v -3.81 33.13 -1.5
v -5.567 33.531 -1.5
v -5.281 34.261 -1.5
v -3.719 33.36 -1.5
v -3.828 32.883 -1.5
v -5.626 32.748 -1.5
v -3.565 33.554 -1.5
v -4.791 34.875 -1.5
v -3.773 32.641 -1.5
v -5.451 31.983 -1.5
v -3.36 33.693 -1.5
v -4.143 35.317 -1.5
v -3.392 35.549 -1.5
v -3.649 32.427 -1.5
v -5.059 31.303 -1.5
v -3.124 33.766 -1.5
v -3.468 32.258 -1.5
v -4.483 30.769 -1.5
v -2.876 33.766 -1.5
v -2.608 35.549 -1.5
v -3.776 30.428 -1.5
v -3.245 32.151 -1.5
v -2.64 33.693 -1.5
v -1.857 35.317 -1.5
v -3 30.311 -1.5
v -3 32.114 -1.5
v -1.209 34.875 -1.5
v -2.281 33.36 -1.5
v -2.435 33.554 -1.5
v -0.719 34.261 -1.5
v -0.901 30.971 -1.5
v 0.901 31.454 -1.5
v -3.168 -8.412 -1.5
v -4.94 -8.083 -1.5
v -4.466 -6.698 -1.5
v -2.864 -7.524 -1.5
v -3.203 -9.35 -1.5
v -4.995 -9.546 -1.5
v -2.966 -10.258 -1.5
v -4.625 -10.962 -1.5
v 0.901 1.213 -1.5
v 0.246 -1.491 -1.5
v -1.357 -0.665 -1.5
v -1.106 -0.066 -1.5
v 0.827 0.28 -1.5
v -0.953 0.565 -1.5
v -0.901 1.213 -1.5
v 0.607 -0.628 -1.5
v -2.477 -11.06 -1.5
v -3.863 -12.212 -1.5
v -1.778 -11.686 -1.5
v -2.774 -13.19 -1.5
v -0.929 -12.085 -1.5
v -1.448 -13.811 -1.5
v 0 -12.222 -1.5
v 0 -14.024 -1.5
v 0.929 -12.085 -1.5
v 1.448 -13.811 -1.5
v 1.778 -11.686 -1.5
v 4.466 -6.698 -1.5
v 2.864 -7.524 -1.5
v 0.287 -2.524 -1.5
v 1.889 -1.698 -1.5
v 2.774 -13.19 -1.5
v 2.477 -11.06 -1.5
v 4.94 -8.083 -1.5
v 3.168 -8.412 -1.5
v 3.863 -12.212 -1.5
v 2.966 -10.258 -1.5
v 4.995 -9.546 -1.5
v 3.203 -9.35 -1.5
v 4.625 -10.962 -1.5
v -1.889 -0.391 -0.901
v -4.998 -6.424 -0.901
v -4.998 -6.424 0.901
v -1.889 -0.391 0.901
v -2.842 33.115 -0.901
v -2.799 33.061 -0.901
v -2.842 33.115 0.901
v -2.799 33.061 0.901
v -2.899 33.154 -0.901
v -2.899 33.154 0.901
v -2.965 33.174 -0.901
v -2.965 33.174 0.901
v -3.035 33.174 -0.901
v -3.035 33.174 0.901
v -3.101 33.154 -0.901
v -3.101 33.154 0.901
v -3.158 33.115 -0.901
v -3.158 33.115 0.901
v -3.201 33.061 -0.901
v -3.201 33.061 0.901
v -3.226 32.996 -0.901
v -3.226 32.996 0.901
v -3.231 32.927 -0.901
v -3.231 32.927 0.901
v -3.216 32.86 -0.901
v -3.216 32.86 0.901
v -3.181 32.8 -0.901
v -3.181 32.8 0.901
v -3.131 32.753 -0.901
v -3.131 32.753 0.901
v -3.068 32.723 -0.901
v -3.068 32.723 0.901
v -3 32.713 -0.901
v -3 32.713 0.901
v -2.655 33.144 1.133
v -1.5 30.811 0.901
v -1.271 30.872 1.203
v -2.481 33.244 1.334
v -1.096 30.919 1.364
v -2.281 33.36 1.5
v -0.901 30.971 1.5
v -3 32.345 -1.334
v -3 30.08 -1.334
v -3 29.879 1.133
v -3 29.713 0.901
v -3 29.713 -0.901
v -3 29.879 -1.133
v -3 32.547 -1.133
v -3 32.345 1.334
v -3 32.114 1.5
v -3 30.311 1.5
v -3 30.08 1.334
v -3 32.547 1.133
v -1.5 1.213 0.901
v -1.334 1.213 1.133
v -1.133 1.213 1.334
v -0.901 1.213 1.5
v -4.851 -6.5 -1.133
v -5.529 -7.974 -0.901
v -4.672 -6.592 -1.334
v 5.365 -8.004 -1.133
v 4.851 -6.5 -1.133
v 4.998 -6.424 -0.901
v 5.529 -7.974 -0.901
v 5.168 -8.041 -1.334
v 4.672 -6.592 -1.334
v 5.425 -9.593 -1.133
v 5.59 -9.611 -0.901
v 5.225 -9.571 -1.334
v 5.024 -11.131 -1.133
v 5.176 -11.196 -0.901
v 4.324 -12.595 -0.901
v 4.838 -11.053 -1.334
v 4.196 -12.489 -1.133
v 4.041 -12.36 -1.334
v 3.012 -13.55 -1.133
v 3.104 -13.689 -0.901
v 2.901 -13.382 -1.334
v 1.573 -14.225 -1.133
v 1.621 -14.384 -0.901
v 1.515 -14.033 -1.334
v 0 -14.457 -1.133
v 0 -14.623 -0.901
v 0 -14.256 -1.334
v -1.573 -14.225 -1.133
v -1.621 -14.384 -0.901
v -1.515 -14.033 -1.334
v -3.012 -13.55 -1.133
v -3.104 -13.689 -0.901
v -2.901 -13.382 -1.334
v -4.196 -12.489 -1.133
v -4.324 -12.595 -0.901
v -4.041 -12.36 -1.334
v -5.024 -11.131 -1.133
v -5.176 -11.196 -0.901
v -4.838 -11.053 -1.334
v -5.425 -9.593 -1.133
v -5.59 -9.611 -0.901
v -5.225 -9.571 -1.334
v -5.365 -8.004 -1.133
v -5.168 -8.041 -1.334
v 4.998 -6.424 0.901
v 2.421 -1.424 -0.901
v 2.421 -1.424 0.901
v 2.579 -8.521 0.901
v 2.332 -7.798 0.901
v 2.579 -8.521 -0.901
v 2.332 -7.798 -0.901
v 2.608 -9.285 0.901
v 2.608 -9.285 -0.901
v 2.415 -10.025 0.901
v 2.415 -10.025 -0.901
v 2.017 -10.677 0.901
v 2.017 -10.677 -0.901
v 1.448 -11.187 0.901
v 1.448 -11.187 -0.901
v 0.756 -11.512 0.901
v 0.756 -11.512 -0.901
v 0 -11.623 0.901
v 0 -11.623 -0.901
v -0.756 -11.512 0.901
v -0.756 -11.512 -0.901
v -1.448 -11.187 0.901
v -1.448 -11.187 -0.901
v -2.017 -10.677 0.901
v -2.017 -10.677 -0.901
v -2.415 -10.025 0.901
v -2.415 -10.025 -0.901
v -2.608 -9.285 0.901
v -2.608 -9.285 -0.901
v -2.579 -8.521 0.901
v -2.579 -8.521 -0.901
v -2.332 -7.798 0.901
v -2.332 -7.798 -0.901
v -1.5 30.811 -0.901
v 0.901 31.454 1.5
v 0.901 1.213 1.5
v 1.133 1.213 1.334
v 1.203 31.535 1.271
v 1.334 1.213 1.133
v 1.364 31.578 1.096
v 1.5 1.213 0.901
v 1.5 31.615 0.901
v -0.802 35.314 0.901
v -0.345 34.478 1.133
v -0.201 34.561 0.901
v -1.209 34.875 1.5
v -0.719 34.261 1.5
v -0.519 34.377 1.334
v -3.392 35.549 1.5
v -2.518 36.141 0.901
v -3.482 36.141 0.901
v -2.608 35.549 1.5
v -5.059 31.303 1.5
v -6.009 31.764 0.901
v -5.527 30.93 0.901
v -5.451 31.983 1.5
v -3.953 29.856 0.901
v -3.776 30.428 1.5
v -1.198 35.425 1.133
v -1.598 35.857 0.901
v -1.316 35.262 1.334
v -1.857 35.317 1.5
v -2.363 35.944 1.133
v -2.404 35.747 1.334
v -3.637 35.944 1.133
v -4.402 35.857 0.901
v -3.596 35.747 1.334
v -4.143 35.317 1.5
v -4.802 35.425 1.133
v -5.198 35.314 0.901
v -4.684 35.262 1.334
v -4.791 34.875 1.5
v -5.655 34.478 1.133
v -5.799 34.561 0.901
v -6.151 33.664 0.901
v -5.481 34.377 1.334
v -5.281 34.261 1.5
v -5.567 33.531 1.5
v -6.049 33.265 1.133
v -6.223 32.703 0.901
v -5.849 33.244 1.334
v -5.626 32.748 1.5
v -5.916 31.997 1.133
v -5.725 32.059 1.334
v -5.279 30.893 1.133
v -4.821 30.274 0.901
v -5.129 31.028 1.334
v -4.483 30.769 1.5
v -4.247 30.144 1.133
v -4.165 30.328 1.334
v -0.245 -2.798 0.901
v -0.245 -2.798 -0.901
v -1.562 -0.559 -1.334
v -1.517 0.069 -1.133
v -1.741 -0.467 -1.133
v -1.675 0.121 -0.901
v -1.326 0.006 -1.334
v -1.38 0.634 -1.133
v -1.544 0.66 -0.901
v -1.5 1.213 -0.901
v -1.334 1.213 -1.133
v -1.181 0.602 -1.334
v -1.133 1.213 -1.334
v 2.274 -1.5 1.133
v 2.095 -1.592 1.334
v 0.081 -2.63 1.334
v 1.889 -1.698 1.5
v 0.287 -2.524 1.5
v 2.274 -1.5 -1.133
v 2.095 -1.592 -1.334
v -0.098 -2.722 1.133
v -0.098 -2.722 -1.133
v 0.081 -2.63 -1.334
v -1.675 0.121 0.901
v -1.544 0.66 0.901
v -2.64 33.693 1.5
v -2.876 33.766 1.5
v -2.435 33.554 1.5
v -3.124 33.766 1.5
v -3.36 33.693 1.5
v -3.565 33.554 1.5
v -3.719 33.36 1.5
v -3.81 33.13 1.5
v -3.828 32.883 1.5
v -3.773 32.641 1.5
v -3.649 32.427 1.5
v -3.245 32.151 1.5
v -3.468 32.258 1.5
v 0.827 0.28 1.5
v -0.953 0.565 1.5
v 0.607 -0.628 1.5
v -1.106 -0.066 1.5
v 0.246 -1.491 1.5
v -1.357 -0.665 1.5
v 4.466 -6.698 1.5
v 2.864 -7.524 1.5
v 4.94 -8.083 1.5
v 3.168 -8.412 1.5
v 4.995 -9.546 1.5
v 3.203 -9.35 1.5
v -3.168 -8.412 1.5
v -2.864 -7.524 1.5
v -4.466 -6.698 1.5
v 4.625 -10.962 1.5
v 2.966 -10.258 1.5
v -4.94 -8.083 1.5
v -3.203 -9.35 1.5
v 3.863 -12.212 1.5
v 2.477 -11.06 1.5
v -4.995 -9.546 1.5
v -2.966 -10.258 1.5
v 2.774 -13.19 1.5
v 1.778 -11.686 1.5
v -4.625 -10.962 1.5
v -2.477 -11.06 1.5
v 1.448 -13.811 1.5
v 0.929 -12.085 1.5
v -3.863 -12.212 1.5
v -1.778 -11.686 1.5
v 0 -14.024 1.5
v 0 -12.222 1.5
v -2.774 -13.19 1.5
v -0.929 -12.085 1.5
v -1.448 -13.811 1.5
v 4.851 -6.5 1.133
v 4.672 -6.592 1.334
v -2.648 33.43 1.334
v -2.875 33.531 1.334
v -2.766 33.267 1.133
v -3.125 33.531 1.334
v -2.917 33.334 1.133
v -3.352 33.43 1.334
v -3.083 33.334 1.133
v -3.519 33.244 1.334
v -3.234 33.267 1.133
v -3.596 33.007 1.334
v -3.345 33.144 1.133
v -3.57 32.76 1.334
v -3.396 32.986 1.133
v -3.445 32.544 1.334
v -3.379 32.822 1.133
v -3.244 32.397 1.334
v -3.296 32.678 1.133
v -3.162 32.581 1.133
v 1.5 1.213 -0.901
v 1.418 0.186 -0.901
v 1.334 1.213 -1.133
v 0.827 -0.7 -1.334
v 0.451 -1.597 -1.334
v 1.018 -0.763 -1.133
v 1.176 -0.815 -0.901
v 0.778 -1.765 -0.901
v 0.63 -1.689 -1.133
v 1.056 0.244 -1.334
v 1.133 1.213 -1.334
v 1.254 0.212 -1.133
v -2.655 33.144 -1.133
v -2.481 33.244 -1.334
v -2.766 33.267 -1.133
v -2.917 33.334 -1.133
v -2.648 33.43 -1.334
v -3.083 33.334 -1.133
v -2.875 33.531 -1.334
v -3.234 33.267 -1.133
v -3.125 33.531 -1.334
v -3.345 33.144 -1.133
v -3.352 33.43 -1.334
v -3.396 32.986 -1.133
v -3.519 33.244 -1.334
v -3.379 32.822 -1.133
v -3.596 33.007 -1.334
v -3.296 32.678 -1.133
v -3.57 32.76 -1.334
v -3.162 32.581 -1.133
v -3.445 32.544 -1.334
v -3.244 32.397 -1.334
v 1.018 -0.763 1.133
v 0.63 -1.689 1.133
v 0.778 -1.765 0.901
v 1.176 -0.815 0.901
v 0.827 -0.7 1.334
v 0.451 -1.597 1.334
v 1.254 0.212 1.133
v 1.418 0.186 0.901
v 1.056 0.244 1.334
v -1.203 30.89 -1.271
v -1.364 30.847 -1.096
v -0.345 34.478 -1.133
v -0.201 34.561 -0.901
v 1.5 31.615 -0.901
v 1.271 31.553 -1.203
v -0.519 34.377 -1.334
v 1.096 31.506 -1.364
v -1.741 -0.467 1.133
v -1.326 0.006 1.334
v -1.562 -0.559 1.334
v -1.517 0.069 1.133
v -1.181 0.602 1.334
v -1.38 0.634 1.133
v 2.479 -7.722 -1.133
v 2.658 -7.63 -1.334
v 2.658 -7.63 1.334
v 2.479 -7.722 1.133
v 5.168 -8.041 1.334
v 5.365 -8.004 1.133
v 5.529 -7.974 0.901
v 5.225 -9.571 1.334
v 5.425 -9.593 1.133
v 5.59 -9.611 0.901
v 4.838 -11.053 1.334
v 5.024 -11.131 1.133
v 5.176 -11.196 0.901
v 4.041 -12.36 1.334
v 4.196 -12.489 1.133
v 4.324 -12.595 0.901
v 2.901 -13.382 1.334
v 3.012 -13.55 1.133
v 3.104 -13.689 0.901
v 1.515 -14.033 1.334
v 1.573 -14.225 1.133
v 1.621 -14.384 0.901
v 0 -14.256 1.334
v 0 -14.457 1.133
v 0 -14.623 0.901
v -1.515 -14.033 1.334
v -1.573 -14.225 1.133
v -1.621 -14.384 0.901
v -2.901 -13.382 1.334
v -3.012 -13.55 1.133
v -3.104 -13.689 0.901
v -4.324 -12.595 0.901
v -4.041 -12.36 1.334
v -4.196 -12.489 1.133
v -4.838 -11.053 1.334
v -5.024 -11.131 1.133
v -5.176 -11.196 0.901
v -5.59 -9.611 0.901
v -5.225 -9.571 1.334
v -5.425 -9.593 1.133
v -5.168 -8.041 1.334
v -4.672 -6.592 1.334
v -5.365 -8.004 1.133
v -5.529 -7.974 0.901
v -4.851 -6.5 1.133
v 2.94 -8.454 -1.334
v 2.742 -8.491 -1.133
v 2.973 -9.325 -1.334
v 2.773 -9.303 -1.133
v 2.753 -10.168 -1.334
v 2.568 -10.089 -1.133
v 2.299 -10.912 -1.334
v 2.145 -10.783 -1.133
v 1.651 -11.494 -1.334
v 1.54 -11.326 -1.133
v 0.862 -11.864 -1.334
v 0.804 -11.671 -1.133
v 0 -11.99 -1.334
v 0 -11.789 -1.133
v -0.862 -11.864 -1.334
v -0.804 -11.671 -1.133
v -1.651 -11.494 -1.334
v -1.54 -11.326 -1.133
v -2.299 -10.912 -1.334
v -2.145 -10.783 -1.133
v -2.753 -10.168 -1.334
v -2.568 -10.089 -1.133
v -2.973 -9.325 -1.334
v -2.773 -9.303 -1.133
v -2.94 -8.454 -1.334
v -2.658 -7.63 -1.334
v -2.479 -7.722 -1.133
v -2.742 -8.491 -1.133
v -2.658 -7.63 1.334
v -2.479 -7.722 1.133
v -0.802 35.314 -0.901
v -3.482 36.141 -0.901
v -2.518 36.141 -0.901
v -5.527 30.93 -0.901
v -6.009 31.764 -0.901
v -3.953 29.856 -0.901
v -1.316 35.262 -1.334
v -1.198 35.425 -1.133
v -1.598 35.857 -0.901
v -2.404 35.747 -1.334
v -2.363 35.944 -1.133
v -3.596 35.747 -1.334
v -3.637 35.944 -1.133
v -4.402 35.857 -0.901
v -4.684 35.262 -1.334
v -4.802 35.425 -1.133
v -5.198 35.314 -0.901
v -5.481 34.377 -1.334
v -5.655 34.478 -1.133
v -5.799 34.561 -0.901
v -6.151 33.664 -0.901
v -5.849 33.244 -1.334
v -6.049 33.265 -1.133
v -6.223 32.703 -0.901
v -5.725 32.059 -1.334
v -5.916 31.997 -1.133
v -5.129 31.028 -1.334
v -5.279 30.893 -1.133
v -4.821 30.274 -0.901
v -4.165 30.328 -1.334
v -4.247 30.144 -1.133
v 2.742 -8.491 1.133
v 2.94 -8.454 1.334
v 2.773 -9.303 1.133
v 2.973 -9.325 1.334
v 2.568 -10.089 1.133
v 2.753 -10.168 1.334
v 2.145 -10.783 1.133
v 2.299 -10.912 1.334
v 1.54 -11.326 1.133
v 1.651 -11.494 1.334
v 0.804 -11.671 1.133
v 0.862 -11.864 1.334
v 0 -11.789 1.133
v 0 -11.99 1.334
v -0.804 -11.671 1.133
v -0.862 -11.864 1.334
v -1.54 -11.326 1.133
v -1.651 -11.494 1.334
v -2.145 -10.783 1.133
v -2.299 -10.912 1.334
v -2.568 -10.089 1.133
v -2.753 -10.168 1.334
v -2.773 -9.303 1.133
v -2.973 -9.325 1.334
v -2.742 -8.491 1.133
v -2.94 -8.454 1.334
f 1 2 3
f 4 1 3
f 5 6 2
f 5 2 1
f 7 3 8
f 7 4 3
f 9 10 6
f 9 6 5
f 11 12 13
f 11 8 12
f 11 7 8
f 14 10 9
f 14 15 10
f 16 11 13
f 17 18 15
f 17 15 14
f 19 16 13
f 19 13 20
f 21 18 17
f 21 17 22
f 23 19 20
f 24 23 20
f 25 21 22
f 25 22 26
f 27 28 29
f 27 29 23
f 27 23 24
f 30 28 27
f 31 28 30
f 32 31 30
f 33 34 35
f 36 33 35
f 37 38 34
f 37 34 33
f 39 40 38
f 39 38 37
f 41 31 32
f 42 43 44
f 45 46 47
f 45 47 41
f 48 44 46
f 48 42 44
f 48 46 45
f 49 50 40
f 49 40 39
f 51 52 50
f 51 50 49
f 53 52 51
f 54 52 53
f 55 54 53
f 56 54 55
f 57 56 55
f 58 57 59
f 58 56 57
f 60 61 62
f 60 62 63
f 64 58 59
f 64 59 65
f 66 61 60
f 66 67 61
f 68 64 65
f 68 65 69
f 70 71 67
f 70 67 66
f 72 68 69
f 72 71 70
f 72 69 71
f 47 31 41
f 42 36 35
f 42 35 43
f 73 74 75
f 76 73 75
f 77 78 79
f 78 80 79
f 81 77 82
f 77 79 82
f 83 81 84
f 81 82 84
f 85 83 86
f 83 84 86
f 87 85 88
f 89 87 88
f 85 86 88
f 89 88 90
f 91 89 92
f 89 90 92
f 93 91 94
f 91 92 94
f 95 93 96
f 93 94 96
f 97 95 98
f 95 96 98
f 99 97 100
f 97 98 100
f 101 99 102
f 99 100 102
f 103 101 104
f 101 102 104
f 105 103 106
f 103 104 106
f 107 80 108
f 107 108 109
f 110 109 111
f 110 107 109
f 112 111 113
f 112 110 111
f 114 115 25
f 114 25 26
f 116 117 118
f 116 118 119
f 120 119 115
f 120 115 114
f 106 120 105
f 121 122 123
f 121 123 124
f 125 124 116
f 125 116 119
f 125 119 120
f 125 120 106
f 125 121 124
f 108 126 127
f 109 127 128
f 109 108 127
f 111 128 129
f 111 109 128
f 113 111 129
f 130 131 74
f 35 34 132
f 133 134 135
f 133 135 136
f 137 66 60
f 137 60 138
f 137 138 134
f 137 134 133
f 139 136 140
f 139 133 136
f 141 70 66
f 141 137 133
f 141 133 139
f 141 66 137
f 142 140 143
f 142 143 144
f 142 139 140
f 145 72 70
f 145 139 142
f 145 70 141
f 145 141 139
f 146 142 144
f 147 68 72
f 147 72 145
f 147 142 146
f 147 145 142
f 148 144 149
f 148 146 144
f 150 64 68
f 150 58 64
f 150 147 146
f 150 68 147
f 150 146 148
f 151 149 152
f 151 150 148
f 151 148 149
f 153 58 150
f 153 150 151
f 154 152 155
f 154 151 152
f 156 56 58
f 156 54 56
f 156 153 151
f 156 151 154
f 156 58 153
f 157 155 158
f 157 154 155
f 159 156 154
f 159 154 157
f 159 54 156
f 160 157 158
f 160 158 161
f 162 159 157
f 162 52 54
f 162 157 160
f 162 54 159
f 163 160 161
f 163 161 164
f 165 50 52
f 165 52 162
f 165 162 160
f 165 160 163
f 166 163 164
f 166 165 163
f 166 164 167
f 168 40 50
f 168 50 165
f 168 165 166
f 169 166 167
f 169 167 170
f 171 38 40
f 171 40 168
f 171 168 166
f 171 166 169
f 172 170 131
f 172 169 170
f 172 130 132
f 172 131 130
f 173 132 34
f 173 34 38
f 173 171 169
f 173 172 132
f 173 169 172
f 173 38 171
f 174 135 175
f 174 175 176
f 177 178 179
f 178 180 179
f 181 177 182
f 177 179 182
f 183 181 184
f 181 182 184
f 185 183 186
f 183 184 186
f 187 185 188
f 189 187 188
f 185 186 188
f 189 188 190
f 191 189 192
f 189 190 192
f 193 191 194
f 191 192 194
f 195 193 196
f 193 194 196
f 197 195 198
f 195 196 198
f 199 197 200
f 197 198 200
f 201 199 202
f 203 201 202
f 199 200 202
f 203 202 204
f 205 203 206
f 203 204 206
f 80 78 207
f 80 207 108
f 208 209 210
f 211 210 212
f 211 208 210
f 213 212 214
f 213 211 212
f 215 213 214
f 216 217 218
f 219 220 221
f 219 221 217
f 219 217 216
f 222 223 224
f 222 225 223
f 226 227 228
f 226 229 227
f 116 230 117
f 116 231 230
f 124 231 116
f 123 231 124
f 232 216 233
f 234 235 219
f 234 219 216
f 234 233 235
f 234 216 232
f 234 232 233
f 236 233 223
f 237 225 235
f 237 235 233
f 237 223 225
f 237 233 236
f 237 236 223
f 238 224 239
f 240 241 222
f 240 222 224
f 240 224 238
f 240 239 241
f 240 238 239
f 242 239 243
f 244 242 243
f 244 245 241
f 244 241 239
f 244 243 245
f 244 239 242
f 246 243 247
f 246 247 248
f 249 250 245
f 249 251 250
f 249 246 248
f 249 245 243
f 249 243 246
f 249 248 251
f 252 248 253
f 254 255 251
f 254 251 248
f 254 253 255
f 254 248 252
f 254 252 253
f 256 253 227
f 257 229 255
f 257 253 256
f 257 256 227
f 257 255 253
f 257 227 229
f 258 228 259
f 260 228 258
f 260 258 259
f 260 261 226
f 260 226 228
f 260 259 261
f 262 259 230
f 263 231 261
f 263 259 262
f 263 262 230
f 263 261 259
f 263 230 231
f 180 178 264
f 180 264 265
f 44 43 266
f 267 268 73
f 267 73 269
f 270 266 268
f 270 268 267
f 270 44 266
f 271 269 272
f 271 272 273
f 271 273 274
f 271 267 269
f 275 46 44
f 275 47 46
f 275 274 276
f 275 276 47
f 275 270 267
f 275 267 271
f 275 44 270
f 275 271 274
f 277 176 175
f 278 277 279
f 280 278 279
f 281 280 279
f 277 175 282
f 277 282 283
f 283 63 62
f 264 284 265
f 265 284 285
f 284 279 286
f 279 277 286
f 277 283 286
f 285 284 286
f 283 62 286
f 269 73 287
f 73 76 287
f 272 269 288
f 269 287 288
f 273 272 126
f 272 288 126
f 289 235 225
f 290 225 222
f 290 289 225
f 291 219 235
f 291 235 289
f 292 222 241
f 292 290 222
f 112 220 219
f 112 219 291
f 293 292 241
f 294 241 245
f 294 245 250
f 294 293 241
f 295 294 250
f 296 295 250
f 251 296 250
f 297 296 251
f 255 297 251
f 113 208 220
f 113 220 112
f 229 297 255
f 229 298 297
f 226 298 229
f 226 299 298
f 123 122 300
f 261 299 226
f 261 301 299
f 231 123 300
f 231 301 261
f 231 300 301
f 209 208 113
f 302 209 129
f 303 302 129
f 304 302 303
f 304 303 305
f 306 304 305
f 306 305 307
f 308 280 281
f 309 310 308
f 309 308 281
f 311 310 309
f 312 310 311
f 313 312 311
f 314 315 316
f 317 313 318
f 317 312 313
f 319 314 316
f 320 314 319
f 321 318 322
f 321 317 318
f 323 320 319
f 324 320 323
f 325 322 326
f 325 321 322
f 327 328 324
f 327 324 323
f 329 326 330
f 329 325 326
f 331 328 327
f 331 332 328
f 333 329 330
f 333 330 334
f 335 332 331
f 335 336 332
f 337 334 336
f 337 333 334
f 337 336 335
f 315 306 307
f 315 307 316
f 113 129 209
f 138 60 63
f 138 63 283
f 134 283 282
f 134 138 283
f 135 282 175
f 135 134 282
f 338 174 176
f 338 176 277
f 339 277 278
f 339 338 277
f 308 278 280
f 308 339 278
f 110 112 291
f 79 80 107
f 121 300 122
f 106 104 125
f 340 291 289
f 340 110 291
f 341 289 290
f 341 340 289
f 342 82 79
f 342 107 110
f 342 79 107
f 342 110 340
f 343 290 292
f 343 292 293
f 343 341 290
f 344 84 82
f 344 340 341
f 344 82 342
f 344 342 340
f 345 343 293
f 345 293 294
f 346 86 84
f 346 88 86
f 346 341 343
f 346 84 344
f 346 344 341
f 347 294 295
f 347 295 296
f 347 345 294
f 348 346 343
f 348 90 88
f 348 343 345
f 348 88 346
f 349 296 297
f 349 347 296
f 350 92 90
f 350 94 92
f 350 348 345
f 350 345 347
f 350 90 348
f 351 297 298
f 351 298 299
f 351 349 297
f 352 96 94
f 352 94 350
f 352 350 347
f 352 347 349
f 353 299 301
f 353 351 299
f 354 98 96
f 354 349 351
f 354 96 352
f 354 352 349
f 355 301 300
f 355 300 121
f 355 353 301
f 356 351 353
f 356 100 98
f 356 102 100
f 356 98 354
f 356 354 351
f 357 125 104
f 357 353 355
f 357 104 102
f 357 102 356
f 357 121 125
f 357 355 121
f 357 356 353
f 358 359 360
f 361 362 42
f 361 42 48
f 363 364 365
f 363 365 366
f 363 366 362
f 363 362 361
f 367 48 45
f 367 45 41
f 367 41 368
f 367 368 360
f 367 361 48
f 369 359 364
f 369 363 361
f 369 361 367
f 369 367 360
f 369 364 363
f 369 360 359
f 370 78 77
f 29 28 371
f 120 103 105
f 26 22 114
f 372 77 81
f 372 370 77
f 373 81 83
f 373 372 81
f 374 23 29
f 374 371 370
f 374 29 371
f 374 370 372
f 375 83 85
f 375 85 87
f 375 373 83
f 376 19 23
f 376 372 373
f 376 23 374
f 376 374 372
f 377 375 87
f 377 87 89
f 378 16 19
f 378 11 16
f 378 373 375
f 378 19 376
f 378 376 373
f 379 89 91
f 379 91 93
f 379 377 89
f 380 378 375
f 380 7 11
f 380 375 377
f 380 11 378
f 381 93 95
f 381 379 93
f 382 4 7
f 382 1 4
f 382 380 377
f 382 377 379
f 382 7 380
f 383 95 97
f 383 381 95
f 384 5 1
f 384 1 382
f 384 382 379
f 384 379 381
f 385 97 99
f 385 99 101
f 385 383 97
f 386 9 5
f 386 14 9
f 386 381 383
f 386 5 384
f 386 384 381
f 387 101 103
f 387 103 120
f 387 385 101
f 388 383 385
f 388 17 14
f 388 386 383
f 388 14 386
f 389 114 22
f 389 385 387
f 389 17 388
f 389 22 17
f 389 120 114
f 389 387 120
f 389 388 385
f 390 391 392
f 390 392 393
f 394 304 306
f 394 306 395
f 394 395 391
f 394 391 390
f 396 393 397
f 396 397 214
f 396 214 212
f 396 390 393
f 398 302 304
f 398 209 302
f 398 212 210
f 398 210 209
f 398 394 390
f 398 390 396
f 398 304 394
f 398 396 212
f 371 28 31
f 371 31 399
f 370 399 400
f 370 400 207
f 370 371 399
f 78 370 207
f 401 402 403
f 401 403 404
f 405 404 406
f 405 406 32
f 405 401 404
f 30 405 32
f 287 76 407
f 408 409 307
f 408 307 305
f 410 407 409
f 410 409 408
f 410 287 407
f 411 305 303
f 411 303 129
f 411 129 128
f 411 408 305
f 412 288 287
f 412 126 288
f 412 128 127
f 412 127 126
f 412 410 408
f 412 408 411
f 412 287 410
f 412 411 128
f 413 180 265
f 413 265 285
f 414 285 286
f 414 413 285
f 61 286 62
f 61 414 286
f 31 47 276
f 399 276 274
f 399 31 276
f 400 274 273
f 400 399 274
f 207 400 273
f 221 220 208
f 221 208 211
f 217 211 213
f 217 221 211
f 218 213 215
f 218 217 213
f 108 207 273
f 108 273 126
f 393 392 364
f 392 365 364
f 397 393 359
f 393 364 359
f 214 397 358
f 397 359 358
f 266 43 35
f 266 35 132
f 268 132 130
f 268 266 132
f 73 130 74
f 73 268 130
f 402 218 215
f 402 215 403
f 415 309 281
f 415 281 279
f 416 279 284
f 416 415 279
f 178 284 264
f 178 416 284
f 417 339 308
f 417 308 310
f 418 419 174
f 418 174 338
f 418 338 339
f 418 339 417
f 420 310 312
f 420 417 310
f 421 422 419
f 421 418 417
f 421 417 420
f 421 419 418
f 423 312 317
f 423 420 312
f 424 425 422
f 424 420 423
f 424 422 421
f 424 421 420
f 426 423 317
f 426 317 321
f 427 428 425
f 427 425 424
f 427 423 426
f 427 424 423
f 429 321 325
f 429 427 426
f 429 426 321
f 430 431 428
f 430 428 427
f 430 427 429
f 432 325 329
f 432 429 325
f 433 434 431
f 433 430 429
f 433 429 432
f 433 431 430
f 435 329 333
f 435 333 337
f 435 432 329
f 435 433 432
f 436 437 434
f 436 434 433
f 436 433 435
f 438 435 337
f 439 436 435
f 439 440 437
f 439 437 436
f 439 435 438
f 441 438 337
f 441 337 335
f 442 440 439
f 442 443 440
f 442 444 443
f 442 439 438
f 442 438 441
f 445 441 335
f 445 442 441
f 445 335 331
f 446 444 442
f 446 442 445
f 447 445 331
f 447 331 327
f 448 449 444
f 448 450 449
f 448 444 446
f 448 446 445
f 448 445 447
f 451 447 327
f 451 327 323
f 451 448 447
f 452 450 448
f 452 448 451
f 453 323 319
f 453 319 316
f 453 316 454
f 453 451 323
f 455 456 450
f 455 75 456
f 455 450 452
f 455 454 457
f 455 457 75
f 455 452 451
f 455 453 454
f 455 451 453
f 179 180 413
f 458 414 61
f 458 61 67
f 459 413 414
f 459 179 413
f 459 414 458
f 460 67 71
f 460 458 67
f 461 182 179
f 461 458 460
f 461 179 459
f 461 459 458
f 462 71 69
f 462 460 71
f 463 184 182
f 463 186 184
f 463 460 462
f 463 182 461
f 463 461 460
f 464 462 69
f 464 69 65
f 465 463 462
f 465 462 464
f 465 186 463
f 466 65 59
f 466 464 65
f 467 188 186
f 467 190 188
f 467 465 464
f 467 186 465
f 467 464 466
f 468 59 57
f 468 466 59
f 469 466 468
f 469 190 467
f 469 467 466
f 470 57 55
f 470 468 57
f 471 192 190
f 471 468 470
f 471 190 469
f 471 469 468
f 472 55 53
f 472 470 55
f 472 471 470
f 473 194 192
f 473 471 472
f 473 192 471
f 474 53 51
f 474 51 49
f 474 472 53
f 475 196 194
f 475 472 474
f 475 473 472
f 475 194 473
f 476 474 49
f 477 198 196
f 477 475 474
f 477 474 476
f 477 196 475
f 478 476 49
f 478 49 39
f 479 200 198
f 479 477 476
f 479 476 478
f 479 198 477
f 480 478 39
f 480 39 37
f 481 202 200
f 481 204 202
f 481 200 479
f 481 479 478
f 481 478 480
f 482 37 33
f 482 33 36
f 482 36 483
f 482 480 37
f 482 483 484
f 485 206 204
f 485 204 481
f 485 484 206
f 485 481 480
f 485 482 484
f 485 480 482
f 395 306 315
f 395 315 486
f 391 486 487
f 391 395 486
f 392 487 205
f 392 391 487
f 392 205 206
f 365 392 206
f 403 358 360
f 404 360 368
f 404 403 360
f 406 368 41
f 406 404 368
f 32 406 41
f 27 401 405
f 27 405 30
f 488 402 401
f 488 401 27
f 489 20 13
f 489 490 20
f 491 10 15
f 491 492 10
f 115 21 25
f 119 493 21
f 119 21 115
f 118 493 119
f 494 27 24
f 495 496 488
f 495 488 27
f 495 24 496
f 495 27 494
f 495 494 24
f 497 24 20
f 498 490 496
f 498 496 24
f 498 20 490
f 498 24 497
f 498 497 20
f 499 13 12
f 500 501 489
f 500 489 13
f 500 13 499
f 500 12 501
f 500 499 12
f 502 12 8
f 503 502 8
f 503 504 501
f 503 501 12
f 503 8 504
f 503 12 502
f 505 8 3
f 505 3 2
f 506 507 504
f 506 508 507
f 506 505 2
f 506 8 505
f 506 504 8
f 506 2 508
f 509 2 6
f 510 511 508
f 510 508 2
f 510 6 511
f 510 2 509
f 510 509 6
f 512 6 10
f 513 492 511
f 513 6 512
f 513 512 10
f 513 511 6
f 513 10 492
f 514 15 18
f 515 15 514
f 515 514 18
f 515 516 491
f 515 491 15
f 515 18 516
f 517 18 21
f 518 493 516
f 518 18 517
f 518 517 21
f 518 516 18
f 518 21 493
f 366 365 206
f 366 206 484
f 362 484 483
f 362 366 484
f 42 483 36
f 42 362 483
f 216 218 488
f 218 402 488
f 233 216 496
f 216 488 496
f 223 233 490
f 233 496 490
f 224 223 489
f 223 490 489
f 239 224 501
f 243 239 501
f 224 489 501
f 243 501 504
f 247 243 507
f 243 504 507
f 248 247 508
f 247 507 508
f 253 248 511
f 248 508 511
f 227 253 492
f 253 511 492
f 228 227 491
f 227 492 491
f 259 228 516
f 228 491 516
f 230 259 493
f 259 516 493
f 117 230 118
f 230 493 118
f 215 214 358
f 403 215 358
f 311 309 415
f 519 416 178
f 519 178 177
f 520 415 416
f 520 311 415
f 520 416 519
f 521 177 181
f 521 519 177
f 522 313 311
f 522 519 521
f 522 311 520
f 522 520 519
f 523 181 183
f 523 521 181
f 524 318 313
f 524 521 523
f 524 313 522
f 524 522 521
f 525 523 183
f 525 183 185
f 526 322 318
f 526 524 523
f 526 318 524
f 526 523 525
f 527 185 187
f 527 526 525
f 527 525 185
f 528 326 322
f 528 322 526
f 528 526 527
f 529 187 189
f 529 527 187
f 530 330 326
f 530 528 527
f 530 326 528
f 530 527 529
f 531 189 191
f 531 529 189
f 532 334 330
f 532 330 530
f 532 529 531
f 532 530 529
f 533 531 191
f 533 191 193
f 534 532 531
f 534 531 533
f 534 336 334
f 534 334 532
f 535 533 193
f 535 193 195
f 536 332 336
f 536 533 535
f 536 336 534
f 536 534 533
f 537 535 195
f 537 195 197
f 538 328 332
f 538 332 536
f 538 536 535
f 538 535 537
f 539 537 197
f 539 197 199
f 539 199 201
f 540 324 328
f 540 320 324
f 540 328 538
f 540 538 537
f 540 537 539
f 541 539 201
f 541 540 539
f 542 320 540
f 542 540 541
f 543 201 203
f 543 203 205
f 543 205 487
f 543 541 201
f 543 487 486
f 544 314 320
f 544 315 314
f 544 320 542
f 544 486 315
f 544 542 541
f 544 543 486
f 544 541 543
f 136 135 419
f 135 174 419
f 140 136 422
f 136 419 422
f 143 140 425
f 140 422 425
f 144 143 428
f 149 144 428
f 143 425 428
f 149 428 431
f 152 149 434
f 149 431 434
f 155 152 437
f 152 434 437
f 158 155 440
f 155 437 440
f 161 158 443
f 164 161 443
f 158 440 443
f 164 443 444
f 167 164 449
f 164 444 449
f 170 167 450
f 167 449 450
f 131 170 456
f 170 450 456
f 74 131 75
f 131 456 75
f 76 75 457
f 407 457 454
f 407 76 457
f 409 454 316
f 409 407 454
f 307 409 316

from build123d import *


with BuildPart() as part:
    # 掃出1: sweep along a path in 草圖1
    with BuildLine(Plane.XY) as sweep_1_path:
        Line((1.088041762, -2.111111111), (3.664982778, -7.111111111))
        ThreePointArc((3.664982778, -7.111111111), (0, -13.123105626), (-3.664982778, -7.111111111))
        Line((-3.664982778, -7.111111111), (-0.555555556, -1.077936111))
        ThreePointArc((-0.555555556, -1.077936111), (-0.140873421, 0.034166823), (0, 1.212678125))
        Line((0, 1.212678125), (0, 31.212678125))
        Line((0, 31.212678125), (-1.5, 33.810754337))
        ThreePointArc((-1.5, 33.810754337), (-4.5, 33.810754337), (-3, 31.212678125))
    # 草圖3 → 掃出1 (sweep)
    with BuildSketch(Plane(origin=(-3, 31.212678125, 0), x_dir=(0, 0, -1), z_dir=(1, 0, 0))):
        with BuildLine():
            Line((-0.901387819, 1.5), (0.901387819, 1.5))
            ThreePointArc((0.901387819, 1.5), (1.237436867, 1.237436867), (1.5, 0.901387819))
            Line((1.5, 0.901387819), (1.5, -0.901387819))
            ThreePointArc((1.5, -0.901387819), (1.237436867, -1.237436867), (0.901387819, -1.5))
            Line((0.901387819, -1.5), (-0.901387819, -1.5))
            ThreePointArc((-0.901387819, -1.5), (-1.237436867, -1.237436867), (-1.5, -0.901387819))
            Line((-1.5, -0.901387819), (-1.5, 0.901387819))
            ThreePointArc((-1.5, 0.901387819), (-1.237436867, 1.237436867), (-0.901387819, 1.5))
        make_face()
    sweep(path=sweep_1_path.line, transition=Transition.RIGHT)


solid = part.part
